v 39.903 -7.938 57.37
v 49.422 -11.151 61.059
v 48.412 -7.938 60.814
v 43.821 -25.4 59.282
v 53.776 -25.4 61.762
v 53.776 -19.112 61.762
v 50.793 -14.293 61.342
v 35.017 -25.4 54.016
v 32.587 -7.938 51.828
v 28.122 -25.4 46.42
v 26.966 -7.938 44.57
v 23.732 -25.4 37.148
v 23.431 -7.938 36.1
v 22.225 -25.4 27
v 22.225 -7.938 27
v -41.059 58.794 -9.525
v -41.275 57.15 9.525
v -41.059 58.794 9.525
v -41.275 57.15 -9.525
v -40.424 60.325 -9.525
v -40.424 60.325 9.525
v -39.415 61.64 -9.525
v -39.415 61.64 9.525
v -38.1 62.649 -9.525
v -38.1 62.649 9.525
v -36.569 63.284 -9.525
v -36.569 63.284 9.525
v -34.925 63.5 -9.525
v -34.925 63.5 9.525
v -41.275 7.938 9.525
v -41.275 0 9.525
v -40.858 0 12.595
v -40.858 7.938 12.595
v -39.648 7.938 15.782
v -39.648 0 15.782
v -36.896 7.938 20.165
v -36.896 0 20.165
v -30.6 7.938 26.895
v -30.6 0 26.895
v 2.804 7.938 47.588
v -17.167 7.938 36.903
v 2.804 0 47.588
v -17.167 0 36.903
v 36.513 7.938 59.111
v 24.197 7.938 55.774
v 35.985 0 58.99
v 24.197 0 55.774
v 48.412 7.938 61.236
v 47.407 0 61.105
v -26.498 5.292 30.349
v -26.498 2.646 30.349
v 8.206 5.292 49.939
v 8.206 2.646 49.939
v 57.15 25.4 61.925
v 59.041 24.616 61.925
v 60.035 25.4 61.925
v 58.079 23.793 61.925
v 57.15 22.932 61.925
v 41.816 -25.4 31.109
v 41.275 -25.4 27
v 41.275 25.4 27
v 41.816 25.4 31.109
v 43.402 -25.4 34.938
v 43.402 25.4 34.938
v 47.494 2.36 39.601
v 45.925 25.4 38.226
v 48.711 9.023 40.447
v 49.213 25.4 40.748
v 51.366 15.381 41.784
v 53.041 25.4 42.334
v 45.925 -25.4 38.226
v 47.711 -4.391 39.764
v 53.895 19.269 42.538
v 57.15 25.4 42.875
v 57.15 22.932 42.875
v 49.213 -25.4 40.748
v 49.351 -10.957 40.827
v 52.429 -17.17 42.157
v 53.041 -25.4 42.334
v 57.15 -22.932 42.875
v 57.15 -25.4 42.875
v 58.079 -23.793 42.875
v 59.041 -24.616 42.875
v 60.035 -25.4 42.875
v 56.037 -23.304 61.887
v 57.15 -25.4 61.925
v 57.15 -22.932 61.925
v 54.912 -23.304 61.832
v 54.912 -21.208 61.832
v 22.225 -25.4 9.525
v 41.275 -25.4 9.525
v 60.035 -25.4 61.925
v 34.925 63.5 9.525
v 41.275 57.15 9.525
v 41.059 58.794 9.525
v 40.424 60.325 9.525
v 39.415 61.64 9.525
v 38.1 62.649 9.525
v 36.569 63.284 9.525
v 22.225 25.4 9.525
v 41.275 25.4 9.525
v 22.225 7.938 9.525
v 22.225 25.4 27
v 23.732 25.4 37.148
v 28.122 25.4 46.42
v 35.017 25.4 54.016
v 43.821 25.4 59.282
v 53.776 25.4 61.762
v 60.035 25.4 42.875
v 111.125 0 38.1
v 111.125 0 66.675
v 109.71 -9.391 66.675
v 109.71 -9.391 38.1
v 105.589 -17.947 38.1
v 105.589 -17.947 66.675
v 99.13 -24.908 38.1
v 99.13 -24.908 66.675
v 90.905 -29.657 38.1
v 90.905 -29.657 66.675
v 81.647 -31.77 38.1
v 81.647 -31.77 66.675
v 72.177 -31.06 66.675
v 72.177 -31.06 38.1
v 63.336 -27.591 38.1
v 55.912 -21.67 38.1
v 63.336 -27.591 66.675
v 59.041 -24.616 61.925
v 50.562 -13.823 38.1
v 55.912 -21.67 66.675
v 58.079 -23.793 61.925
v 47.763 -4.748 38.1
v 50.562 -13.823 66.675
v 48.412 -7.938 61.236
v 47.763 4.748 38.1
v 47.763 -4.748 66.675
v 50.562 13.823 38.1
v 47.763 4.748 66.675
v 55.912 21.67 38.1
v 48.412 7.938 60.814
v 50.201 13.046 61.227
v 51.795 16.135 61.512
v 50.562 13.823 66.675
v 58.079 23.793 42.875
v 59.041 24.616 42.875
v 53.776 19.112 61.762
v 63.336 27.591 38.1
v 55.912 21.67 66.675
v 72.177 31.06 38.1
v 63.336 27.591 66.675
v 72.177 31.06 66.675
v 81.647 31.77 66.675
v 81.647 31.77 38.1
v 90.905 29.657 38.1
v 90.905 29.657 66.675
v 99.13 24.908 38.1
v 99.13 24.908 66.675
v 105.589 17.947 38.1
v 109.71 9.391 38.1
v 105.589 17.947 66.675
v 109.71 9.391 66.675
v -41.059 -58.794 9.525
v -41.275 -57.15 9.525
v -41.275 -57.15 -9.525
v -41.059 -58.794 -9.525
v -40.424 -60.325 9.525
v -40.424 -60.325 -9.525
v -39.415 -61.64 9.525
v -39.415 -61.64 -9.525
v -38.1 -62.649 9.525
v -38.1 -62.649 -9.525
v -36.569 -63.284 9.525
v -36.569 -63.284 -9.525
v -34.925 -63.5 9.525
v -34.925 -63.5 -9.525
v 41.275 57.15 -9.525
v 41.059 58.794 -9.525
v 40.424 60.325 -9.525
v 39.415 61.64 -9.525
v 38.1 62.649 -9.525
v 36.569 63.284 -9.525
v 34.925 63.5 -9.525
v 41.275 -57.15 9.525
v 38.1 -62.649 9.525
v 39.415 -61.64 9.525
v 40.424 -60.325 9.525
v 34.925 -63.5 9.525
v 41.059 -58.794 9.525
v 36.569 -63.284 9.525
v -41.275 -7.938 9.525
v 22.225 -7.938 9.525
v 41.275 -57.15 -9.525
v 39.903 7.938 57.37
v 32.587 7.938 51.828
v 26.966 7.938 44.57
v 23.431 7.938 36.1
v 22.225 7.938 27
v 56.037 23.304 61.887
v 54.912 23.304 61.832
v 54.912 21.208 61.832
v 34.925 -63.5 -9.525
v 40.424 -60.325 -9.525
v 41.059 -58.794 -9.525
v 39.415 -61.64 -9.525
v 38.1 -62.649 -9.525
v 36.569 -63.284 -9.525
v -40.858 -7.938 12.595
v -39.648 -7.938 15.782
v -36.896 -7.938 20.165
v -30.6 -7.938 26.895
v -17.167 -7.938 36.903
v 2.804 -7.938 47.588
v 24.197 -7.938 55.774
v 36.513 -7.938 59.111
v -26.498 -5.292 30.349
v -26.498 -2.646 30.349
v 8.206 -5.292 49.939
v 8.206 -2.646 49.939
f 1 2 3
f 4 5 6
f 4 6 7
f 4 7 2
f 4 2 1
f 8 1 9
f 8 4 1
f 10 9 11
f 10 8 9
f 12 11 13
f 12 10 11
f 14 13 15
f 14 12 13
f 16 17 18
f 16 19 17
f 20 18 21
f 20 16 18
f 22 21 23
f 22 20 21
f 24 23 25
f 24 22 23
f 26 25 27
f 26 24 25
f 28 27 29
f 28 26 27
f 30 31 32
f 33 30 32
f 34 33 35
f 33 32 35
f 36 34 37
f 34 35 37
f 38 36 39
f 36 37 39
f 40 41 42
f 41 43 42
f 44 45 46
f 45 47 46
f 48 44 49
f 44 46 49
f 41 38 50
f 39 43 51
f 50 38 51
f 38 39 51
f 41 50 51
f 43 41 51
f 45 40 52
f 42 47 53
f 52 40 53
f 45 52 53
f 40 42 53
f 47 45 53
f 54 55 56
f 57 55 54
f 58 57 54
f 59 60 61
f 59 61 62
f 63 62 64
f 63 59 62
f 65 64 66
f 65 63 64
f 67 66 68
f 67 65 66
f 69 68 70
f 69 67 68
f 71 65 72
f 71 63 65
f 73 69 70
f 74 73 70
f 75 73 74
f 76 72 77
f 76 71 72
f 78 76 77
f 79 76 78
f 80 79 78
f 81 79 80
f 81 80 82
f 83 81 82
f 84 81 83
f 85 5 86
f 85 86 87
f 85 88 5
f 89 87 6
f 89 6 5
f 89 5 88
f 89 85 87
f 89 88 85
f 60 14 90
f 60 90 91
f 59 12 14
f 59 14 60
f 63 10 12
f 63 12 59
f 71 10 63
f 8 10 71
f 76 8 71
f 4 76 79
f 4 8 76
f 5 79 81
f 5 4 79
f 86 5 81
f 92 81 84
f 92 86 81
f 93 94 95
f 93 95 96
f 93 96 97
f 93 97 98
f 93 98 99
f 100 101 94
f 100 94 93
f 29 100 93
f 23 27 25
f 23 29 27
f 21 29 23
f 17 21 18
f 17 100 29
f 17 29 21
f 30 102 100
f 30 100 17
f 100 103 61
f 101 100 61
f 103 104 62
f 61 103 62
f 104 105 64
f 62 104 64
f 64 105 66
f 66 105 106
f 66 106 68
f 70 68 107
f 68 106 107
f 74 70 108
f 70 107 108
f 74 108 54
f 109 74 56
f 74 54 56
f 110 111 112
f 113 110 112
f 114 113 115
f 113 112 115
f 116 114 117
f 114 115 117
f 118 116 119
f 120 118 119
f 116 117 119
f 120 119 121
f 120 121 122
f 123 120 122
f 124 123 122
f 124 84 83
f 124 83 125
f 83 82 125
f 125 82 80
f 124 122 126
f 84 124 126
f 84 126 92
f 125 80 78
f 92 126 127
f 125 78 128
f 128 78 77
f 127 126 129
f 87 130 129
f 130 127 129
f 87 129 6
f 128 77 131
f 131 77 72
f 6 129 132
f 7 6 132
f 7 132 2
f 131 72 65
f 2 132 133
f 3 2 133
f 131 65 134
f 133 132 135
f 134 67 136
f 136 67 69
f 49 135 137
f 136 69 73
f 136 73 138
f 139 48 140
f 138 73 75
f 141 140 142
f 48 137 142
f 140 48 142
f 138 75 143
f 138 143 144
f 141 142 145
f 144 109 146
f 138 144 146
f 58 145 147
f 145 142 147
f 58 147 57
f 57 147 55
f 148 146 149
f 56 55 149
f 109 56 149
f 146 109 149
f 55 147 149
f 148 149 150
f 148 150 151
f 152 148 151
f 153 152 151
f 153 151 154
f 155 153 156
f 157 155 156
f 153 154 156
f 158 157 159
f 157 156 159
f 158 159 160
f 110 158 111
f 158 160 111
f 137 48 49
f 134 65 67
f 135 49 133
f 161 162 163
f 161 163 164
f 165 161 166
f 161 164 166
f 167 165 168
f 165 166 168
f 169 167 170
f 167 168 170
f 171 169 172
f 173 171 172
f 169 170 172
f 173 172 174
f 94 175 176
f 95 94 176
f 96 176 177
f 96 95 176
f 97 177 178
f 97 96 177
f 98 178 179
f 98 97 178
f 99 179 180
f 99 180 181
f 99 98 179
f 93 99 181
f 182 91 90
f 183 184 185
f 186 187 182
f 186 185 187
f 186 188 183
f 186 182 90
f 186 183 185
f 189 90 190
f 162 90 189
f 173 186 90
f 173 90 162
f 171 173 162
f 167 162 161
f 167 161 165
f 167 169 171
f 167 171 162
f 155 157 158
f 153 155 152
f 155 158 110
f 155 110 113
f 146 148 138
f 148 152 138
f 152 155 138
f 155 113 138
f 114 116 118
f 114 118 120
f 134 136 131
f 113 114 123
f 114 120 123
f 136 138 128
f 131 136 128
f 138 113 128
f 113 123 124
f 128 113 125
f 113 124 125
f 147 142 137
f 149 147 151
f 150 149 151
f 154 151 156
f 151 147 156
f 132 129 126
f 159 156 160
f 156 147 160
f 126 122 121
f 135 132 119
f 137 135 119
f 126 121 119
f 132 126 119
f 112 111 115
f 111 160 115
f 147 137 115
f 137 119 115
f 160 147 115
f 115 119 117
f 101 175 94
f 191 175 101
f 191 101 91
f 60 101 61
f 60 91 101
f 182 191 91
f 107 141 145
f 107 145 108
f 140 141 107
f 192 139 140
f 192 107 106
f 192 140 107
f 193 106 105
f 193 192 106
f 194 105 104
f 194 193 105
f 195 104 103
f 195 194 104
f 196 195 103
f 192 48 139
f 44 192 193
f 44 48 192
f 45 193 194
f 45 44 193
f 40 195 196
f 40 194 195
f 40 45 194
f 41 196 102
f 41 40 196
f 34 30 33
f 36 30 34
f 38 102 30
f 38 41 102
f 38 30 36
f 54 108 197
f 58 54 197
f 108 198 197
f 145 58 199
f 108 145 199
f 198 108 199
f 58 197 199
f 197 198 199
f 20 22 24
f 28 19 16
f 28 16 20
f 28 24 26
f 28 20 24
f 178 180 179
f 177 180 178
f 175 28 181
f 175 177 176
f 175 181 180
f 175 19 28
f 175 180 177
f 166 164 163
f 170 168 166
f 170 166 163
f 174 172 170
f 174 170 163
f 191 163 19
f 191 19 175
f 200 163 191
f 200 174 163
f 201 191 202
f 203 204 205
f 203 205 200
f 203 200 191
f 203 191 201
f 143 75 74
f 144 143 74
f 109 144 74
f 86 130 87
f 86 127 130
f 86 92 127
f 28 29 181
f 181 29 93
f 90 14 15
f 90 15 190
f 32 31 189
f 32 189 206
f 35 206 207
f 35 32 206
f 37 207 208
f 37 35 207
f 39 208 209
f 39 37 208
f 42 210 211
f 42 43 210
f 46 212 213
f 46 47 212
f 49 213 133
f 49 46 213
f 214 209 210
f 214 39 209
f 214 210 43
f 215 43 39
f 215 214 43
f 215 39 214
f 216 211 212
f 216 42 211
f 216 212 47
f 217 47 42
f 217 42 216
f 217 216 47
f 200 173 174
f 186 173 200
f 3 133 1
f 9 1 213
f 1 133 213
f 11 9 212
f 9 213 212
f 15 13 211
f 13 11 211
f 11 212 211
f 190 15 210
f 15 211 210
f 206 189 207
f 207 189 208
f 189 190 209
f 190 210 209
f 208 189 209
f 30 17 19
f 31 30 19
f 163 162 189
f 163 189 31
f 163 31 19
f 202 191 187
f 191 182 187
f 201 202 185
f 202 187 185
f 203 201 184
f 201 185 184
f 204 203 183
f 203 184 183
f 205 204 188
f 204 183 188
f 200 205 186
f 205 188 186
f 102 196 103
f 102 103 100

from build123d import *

# Parameters (mm, degrees)
F1_DEPTH = 63.5
F0_W     = 18.940978
F0_H     = 4.7752
F2_DEPTH = 25.4
F3_DEPTH = 7.9375
F5_R     = 6.35


with BuildPart() as f1:
    # F0 (on Front) → F1 (new body, symmetric)
    with BuildSketch(Plane.XZ):
        Polygon((22.225, 9.525), (-41.275, 9.525), (-41.275, -9.525), (41.275, -9.525), (41.275, 9.525), align=None)
    extrude(amount=F1_DEPTH, both=True)

    # F0 (on Front) → F2 (join, symmetric)
    with BuildSketch(Plane.XZ):
        with BuildLine():
            Line((22.225, 27.0002), (22.225, 9.525))
            Line((22.225, 9.525), (41.275, 9.525))
            Line((41.275, 9.525), (41.275, 27.0002))
            ThreePointArc((41.275, 27.0002), (45.92468, 38.22552), (57.15, 42.8752))
            Line((57.15, 42.8752), (60.325, 42.8752))
            Line((60.325, 42.8752), (60.325, 61.9252))
            Line((60.325, 61.9252), (57.15, 61.9252))
            add(Edge.make_bspline(
                [(53.775986, 61.761841), (54.917226, 61.840319), (56.042547, 61.89509), (57.15, 61.9252)],
                knots=[108.292416, 108.292416, 108.292416, 108.292416, 111.504536, 111.504536, 111.504536, 111.504536], degree=3))
            ThreePointArc((53.775986, 61.761841), (31.288899, 50.472718), (22.225, 27.0002))
        make_face()
        with Locations((69.795489, 40.4876)):
            Rectangle(F0_W, F0_H)
    extrude(amount=F2_DEPTH, both=True)

    # F0 (on Front) → F3 (join, symmetric)
    with BuildSketch(Plane.XZ):
        with BuildLine():
            add(Edge.make_bspline(
                [(-41.275, 9.525), (-41.269137, 29.523659), (15.30057, 59.116032), (53.775986, 61.761841)],
                knots=[0, 0, 0, 0, 108.292416, 108.292416, 108.292416, 108.292416], degree=3))
            Line((-41.275, 9.525), (22.225, 9.525))
            Line((22.225, 9.525), (22.225, 27.0002))
            ThreePointArc((22.225, 27.0002), (31.288899, 50.472718), (53.775986, 61.761841))
        make_face()
    extrude(amount=F3_DEPTH, both=True)

    # F0 (on Front) → F4 (revolve)
    with BuildSketch(Plane.XZ):
        Polygon((79.265978, 66.675), (79.265978, 61.9252), (79.265978, 49.505379), (79.265978, 42.8752), (79.265978, 38.1), (111.125, 38.1), (111.125, 66.675), align=None)
    revolve(axis=Axis((79.265978, 0, 52.3875), (0, 0, -1)))

    # F5
    f5_edges = [f1.edges().sort_by_distance(p)[0] for p in [
        (41.275, -63.5, 0),
        (-41.275, -63.5, 0),
        (41.275, 63.5, 0),
        (-41.275, 63.5, 0),
    ]]
    fillet(f5_edges, radius=F5_R)


solid = f1.part
